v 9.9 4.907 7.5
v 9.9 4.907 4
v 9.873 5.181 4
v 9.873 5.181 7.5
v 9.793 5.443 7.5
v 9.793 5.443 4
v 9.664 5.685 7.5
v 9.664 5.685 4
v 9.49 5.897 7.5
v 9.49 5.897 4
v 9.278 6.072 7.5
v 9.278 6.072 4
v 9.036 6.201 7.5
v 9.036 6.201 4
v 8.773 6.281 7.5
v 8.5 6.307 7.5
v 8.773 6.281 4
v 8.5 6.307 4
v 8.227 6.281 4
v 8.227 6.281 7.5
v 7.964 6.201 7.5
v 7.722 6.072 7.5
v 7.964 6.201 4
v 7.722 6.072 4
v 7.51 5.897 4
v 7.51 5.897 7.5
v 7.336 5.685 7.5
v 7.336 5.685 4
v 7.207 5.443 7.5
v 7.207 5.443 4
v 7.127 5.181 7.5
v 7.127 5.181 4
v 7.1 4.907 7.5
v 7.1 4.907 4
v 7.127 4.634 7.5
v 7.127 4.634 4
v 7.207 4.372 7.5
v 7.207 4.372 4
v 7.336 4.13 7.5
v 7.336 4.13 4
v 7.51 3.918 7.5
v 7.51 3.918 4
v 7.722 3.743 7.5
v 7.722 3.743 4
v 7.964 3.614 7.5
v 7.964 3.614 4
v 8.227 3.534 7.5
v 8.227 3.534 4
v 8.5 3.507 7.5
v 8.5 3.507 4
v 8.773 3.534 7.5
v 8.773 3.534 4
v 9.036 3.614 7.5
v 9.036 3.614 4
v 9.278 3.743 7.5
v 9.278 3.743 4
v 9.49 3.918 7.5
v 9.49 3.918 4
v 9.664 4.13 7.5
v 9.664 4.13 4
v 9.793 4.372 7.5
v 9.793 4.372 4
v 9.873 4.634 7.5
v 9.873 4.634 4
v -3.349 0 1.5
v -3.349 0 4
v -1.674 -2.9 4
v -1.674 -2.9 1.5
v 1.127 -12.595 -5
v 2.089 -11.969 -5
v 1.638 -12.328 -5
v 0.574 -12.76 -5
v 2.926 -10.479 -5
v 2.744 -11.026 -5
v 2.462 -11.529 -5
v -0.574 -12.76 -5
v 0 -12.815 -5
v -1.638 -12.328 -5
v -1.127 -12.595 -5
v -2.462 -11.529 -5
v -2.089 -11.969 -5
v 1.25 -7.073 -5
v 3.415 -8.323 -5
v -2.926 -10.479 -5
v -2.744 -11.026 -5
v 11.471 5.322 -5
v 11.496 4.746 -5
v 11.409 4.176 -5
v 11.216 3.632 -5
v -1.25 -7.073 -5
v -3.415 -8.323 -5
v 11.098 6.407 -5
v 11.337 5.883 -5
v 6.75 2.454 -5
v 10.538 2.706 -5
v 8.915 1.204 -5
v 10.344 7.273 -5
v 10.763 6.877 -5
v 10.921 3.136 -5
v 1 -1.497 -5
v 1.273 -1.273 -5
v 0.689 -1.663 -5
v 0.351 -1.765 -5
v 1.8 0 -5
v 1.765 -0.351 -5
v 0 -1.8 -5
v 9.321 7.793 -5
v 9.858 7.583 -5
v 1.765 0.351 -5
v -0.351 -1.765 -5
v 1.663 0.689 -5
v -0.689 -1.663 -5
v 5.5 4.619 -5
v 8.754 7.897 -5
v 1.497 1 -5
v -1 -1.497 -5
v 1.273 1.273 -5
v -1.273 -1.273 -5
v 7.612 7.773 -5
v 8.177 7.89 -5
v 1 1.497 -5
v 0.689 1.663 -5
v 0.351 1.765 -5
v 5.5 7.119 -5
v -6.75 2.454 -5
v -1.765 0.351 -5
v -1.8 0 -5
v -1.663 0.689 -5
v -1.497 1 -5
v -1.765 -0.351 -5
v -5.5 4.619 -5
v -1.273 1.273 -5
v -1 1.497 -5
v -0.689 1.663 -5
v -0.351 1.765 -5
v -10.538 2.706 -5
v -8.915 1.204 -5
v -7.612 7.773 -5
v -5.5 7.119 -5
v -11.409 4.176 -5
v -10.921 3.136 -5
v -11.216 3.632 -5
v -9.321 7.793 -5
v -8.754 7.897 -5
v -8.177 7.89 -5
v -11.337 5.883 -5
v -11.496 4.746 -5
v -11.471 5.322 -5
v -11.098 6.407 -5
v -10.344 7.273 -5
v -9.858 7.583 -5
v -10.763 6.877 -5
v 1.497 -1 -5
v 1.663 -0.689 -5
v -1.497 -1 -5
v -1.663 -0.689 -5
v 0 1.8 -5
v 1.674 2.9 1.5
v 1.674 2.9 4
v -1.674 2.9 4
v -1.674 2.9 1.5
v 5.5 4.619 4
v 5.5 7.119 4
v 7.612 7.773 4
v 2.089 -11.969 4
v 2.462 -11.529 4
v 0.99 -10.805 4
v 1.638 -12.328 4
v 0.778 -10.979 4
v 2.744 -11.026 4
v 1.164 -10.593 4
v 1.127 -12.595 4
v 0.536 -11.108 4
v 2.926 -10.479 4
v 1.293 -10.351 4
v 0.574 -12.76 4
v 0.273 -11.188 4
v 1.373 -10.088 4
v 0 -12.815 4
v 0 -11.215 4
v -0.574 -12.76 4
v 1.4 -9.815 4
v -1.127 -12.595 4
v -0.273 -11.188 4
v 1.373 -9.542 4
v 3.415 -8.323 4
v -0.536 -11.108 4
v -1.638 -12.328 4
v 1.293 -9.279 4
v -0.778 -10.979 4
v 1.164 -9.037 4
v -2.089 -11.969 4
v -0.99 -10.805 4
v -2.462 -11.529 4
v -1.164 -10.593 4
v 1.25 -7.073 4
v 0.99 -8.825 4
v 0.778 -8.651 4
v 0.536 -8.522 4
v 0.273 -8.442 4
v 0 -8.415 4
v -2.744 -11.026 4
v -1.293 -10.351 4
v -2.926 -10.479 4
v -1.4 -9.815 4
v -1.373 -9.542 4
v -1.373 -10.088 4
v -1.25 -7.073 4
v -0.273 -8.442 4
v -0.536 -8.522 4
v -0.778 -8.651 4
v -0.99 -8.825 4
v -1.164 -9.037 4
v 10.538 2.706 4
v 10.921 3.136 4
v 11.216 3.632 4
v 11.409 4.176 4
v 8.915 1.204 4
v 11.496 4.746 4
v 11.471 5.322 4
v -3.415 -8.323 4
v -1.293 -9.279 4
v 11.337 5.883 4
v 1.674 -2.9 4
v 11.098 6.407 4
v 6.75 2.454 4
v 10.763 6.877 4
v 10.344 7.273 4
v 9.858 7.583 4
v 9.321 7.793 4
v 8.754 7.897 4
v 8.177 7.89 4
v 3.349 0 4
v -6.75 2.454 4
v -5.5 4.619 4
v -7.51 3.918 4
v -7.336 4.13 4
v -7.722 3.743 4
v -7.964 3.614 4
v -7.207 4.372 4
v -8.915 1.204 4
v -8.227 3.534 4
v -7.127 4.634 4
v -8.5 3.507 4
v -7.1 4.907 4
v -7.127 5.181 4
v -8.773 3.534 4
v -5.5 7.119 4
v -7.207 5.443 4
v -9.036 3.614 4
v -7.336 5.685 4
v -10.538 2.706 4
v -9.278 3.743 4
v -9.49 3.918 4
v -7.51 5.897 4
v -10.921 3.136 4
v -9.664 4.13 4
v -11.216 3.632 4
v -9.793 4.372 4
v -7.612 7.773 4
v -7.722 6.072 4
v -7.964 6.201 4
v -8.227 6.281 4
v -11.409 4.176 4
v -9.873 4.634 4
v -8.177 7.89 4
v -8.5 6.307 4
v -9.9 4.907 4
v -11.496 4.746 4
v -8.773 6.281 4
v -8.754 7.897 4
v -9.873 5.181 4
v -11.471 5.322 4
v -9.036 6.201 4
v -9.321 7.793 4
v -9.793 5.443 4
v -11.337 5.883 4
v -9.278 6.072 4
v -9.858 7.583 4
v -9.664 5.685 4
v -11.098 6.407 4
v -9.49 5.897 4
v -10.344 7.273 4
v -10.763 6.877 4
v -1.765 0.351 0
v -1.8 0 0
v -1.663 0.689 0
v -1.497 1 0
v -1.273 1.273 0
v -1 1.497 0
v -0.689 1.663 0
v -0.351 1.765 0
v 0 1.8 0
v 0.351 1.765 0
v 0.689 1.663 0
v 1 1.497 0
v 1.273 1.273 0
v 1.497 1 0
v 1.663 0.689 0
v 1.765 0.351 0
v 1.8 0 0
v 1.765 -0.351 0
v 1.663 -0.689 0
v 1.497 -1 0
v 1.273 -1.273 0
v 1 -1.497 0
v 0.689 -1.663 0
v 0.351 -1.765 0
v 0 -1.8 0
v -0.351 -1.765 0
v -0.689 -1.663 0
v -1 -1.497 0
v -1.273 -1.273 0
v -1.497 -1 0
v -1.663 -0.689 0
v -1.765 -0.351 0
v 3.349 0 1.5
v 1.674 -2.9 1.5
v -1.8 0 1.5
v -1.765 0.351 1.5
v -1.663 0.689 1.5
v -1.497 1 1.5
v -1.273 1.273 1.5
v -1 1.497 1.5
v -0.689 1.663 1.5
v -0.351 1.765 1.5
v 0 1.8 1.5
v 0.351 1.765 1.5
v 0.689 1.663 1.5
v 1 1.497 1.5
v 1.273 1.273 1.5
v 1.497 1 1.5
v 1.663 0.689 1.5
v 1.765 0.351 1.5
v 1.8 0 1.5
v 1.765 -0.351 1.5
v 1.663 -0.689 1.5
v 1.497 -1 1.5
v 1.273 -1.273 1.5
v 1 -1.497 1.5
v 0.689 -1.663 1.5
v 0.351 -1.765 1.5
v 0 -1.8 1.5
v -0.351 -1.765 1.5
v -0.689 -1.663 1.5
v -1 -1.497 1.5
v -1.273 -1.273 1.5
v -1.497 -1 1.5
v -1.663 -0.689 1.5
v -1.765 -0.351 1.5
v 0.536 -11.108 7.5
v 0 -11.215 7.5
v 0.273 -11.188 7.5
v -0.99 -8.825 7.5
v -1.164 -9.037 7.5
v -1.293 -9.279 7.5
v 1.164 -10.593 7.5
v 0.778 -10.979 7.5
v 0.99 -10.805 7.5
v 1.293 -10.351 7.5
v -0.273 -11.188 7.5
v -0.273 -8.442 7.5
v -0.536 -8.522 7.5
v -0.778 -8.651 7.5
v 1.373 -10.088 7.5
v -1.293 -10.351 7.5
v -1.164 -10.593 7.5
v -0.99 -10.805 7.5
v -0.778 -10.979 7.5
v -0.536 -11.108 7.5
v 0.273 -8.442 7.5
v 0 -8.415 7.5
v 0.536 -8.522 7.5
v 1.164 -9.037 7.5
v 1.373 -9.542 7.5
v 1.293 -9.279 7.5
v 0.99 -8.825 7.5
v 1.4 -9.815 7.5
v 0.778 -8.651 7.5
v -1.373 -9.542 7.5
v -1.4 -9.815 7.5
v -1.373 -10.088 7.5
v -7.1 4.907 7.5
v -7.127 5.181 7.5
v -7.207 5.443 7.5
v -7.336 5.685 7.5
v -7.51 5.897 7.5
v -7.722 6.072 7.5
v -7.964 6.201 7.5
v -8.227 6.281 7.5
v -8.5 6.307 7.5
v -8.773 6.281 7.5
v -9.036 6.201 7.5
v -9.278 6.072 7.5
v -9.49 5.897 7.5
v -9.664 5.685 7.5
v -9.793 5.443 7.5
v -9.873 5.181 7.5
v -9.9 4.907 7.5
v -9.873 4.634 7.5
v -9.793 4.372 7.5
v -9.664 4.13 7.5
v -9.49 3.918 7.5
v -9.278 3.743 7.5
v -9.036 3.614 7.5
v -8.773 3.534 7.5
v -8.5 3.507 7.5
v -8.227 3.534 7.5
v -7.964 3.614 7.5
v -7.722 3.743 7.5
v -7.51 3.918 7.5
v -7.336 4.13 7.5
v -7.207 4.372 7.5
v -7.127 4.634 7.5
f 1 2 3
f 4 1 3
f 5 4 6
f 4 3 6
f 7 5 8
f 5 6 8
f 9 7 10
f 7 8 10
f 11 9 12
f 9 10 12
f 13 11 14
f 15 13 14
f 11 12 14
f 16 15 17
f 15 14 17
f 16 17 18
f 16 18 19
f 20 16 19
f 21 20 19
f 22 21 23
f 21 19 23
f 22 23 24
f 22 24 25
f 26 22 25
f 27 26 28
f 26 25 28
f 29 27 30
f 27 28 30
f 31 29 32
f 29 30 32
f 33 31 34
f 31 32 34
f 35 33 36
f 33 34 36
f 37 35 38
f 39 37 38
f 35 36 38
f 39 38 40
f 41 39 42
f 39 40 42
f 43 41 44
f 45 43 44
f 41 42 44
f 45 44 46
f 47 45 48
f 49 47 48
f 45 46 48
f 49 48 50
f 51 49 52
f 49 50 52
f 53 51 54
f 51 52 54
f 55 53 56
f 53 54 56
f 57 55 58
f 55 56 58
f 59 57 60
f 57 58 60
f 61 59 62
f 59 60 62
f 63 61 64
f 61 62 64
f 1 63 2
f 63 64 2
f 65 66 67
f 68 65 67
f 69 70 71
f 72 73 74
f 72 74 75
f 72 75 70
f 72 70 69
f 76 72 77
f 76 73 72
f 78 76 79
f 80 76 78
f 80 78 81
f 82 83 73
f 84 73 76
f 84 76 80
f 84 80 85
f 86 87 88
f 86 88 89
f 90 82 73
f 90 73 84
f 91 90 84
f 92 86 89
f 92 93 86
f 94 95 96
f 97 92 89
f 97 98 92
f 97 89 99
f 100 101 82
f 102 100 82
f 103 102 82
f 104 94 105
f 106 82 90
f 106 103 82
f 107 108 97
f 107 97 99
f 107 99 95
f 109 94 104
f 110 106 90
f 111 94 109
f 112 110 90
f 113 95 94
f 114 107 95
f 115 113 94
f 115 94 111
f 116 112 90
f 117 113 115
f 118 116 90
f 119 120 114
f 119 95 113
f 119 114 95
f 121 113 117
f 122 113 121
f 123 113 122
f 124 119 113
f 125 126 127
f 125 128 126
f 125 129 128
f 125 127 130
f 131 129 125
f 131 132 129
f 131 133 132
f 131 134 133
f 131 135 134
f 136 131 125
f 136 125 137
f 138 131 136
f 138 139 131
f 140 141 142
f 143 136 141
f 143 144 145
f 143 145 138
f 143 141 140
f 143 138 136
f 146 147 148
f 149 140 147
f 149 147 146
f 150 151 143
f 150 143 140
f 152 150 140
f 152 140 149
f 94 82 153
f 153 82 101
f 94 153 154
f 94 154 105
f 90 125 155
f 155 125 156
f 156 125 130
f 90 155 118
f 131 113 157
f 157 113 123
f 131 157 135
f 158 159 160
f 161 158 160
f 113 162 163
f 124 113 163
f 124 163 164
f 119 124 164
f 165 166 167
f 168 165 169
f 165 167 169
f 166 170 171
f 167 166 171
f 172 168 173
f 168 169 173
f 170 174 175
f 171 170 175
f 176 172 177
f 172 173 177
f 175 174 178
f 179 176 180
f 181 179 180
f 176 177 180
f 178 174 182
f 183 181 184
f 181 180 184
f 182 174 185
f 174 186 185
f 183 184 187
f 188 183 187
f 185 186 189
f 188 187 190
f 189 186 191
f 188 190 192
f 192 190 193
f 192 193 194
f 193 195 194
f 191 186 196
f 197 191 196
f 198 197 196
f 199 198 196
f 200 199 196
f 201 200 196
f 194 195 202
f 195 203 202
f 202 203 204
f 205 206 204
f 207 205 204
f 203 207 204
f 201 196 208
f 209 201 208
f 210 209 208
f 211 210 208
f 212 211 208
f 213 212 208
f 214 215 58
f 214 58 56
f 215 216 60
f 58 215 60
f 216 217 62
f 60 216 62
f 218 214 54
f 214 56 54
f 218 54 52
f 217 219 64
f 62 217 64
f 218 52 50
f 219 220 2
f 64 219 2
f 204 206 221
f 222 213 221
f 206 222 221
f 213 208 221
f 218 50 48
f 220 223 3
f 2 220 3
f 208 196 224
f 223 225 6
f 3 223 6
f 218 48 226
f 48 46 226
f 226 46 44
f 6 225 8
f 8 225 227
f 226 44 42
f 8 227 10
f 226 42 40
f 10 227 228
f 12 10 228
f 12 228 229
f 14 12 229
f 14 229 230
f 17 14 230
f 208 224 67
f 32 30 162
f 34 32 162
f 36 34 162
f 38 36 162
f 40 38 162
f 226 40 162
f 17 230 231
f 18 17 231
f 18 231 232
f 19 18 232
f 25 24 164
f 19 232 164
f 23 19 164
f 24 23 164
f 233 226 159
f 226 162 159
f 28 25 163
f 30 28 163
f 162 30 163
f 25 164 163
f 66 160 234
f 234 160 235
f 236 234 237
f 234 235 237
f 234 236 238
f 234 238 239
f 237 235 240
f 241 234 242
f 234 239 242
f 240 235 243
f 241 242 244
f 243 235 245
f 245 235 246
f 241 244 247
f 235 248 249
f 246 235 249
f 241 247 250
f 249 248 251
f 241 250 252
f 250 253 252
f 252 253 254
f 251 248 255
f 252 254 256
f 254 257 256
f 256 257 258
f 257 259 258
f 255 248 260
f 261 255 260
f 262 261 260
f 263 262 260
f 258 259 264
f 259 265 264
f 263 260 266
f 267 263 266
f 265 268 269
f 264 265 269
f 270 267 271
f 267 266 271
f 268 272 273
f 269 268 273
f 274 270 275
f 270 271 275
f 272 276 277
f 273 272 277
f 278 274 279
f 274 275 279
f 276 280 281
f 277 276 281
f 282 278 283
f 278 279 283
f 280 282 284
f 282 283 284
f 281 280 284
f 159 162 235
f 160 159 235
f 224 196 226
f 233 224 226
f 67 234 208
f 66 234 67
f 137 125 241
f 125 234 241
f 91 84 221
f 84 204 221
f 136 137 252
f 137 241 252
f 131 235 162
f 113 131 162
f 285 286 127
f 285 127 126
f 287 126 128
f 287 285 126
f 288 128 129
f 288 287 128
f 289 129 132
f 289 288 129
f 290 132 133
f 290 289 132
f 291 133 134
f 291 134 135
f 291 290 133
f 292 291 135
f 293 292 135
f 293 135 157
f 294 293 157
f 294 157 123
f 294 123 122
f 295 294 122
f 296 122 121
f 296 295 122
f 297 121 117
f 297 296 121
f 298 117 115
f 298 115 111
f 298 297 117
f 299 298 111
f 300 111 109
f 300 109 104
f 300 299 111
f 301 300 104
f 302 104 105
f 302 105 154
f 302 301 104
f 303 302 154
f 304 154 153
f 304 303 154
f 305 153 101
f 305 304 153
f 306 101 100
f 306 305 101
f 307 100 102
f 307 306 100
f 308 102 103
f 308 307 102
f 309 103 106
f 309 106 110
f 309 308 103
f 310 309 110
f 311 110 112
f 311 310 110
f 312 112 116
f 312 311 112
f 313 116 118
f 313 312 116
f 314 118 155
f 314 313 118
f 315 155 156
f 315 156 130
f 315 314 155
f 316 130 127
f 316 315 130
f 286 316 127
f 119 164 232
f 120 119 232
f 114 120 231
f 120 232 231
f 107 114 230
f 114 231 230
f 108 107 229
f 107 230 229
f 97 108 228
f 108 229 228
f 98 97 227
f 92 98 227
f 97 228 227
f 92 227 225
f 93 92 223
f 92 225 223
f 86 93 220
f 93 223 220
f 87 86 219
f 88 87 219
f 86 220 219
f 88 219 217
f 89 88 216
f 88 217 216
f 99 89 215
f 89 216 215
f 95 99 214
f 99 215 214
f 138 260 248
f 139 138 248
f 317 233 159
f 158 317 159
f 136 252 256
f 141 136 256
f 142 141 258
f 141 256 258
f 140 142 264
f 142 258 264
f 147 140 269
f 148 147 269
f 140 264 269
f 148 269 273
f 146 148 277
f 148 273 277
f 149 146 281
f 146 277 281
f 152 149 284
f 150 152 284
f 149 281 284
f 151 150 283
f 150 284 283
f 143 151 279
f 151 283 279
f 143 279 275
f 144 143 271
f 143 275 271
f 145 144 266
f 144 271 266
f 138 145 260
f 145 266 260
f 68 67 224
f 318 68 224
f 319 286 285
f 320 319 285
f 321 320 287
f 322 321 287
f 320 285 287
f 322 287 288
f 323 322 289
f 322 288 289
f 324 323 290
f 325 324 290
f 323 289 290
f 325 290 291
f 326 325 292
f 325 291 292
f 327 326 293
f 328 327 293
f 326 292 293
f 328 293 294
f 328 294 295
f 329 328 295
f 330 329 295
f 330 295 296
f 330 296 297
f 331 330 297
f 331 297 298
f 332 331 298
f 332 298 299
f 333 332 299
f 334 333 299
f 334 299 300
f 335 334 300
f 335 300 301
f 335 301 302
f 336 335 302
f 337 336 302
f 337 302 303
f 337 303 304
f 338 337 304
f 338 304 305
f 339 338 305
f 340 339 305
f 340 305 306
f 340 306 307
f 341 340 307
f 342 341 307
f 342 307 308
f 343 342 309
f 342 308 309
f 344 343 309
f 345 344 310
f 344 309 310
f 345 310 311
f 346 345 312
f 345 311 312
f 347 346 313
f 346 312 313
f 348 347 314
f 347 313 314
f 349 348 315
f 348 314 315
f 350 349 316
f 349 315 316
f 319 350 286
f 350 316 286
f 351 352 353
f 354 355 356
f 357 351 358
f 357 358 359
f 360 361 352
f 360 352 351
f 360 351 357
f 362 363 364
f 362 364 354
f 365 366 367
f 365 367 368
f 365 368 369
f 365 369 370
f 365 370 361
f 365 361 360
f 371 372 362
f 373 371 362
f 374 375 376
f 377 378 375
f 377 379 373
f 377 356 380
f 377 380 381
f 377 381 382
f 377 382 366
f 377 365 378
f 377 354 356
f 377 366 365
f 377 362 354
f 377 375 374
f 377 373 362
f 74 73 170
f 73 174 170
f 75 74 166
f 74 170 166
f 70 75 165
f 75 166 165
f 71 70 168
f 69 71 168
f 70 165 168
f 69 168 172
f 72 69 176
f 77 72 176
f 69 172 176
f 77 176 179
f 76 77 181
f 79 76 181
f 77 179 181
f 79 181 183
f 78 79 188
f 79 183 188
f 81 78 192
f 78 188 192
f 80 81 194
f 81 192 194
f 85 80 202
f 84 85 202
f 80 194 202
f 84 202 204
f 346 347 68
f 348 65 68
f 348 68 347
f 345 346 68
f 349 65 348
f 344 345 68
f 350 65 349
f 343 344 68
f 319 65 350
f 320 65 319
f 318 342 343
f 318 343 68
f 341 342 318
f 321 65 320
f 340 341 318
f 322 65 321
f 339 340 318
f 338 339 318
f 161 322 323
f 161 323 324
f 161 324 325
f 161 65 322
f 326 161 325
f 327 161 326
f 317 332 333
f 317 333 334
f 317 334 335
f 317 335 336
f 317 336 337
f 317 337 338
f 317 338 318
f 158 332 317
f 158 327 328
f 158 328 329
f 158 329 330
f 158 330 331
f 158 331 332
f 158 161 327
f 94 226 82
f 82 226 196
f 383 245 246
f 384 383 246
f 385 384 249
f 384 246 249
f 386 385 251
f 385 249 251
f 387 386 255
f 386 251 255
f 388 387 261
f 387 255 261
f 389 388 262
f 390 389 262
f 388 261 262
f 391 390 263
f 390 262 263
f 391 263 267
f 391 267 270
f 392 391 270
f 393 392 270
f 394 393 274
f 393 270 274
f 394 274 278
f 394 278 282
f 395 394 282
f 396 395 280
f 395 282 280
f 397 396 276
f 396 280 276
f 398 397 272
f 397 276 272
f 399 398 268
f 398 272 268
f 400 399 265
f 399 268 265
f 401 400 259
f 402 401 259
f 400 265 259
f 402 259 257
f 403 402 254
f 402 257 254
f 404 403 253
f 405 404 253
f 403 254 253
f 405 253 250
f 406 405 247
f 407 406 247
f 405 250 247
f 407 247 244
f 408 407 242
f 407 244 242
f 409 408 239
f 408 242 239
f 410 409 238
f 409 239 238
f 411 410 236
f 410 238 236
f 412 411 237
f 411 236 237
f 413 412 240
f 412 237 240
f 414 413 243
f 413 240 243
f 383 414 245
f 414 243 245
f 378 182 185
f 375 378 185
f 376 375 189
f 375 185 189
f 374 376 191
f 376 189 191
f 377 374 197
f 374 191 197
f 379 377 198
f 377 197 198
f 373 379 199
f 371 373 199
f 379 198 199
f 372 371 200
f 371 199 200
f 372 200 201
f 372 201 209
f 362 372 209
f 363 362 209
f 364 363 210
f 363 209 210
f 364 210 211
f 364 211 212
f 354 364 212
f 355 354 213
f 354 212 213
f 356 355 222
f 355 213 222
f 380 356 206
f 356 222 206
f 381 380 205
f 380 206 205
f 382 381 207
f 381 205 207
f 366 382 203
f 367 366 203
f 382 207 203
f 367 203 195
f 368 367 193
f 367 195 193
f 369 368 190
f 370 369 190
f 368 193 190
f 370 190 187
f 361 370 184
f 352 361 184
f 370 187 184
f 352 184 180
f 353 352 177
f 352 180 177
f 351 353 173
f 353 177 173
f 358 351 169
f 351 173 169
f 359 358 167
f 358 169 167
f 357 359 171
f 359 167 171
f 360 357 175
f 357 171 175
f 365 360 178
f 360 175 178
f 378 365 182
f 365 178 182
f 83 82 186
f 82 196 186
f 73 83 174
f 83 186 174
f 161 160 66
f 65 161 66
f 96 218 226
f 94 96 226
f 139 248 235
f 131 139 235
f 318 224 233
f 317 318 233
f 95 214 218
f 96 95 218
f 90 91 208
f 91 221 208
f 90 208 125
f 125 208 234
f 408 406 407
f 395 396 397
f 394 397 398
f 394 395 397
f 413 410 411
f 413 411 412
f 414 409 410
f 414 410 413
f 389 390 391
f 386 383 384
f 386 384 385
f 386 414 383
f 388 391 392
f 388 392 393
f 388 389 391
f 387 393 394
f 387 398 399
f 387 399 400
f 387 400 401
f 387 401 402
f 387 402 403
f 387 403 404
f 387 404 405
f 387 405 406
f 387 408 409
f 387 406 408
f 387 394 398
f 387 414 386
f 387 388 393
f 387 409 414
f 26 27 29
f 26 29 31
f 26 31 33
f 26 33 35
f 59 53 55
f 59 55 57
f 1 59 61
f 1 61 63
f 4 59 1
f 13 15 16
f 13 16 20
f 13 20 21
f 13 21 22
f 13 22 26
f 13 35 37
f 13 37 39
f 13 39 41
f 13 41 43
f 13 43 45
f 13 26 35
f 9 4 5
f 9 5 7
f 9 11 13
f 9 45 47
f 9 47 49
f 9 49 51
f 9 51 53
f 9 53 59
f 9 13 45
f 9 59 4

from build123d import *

# Parameters (mm, degrees)
EXTRUDE_1_DEPTH     = 4
SKETCH_2_R          = 1.4
EXTRUDE_2_DEPTH     = 3.5
CUT_EXTRUDE_1_DEPTH = 2.5
SKETCH_6_R          = 1.8
CUT_EXTRUDE_2_DEPTH = 8.5
SKETCH_7_R          = 1.8
EXTRUDE_3_DEPTH     = 5


with BuildPart() as part:
    # ｽｹｯﾁ1 → ﾎﾞｽ - 押し出し1 (new body)
    with BuildSketch(Plane.XY):
        with BuildLine():
            Line((-6.75, 2.453738644), (-8.915063509, 1.203738644))
            Line((-8.915063509, 1.203738644), (-10.537880917, 2.705877559))
            ThreePointArc((-10.537880917, 2.705877559), (-11.098076211, 6.407477288), (-7.612299165, 7.773133797))
            Line((-7.612299165, 7.773133797), (-5.5, 7.118802154))
            Line((-5.5, 7.118802154), (-5.5, 4.618802154))
            Line((-5.5, 4.618802154), (5.5, 4.618802154))
            Line((5.5, 4.618802154), (5.5, 7.118802154))
            Line((5.5, 7.118802154), (7.612299165, 7.773133797))
            ThreePointArc((7.612299165, 7.773133797), (11.098076211, 6.407477288), (10.537880917, 2.705877559))
            Line((10.537880917, 2.705877559), (8.915063509, 1.203738644))
            Line((8.915063509, 1.203738644), (6.75, 2.453738644))
            Line((6.75, 2.453738644), (1.25, -7.072540798))
            Line((1.25, -7.072540798), (3.415063509, -8.322540798))
            Line((3.415063509, -8.322540798), (2.925581753, -10.479011356))
            ThreePointArc((2.925581753, -10.479011356), (0, -12.814954576), (-2.925581753, -10.479011356))
            Line((-2.925581753, -10.479011356), (-3.415063509, -8.322540798))
            Line((-3.415063509, -8.322540798), (-1.25, -7.072540798))
            Line((-1.25, -7.072540798), (-6.75, 2.453738644))
        make_face()
    extrude(amount=EXTRUDE_1_DEPTH)

    # ｽｹｯﾁ2 → ﾎﾞｽ - 押し出し2 (add)
    with BuildSketch(Plane.XY.offset(4)):
        with Locations((-8.5, 4.907477288)):
            Circle(SKETCH_2_R)
        with Locations((0, -9.814954576)):
            Circle(SKETCH_2_R)
        with Locations((8.5, 4.907477288)):
            Circle(SKETCH_2_R)
    extrude(amount=EXTRUDE_2_DEPTH)

    # ｽｹｯﾁ4 → ｶｯﾄ - 押し出し1 (cut)
    with BuildSketch(Plane.XY.offset(4)):
        Polygon((-1.674315781, -2.9), (1.674315781, -2.9), (3.348631561, 0), (1.674315781, 2.9), (-1.674315781, 2.9), (-3.348631561, 0), align=None)
    extrude(amount=-CUT_EXTRUDE_1_DEPTH, mode=Mode.SUBTRACT)

    # ｽｹｯﾁ6 → ｶｯﾄ - 押し出し2 (cut, through all)
    with BuildSketch(Plane(origin=(0, 0, 0), x_dir=(-1, 0, 0), z_dir=(0, 0, -1))):
        Circle(SKETCH_6_R)
    extrude(amount=-CUT_EXTRUDE_2_DEPTH, mode=Mode.SUBTRACT)

    # ｽｹｯﾁ7 → ﾎﾞｽ - 押し出し3 (add)
    with BuildSketch(Plane(origin=(0, 0, 0), x_dir=(-1, 0, 0), z_dir=(0, 0, -1))):
        with BuildLine():
            Line((-8.915063509, 1.203738644), (-6.75, 2.453738644))
            Line((-6.75, 2.453738644), (-1.25, -7.072540798))
            Line((-1.25, -7.072540798), (-3.415063509, -8.322540798))
            Line((-3.415063509, -8.322540798), (-2.925581753, -10.479011356))
            ThreePointArc((-2.925581753, -10.479011356), (0, -12.814954576), (2.925581753, -10.479011356))
            Line((2.925581753, -10.479011356), (3.415063509, -8.322540798))
            Line((3.415063509, -8.322540798), (1.25, -7.072540798))
            Line((1.25, -7.072540798), (6.75, 2.453738644))
            Line((6.75, 2.453738644), (8.915063509, 1.203738644))
            Line((8.915063509, 1.203738644), (10.537880917, 2.705877559))
            ThreePointArc((10.537880917, 2.705877559), (11.098076211, 6.407477288), (7.612299165, 7.773133797))
            Line((7.612299165, 7.773133797), (5.5, 7.118802154))
            Line((5.5, 7.118802154), (5.5, 4.618802154))
            Line((5.5, 4.618802154), (-5.5, 4.618802154))
            Line((-5.5, 4.618802154), (-5.5, 7.118802154))
            Line((-5.5, 7.118802154), (-7.612299165, 7.773133797))
            ThreePointArc((-7.612299165, 7.773133797), (-11.098076211, 6.407477288), (-10.537880917, 2.705877559))
            Line((-10.537880917, 2.705877559), (-8.915063509, 1.203738644))
        make_face()
        Circle(SKETCH_7_R, mode=Mode.SUBTRACT)
    extrude(amount=EXTRUDE_3_DEPTH)


solid = part.part
